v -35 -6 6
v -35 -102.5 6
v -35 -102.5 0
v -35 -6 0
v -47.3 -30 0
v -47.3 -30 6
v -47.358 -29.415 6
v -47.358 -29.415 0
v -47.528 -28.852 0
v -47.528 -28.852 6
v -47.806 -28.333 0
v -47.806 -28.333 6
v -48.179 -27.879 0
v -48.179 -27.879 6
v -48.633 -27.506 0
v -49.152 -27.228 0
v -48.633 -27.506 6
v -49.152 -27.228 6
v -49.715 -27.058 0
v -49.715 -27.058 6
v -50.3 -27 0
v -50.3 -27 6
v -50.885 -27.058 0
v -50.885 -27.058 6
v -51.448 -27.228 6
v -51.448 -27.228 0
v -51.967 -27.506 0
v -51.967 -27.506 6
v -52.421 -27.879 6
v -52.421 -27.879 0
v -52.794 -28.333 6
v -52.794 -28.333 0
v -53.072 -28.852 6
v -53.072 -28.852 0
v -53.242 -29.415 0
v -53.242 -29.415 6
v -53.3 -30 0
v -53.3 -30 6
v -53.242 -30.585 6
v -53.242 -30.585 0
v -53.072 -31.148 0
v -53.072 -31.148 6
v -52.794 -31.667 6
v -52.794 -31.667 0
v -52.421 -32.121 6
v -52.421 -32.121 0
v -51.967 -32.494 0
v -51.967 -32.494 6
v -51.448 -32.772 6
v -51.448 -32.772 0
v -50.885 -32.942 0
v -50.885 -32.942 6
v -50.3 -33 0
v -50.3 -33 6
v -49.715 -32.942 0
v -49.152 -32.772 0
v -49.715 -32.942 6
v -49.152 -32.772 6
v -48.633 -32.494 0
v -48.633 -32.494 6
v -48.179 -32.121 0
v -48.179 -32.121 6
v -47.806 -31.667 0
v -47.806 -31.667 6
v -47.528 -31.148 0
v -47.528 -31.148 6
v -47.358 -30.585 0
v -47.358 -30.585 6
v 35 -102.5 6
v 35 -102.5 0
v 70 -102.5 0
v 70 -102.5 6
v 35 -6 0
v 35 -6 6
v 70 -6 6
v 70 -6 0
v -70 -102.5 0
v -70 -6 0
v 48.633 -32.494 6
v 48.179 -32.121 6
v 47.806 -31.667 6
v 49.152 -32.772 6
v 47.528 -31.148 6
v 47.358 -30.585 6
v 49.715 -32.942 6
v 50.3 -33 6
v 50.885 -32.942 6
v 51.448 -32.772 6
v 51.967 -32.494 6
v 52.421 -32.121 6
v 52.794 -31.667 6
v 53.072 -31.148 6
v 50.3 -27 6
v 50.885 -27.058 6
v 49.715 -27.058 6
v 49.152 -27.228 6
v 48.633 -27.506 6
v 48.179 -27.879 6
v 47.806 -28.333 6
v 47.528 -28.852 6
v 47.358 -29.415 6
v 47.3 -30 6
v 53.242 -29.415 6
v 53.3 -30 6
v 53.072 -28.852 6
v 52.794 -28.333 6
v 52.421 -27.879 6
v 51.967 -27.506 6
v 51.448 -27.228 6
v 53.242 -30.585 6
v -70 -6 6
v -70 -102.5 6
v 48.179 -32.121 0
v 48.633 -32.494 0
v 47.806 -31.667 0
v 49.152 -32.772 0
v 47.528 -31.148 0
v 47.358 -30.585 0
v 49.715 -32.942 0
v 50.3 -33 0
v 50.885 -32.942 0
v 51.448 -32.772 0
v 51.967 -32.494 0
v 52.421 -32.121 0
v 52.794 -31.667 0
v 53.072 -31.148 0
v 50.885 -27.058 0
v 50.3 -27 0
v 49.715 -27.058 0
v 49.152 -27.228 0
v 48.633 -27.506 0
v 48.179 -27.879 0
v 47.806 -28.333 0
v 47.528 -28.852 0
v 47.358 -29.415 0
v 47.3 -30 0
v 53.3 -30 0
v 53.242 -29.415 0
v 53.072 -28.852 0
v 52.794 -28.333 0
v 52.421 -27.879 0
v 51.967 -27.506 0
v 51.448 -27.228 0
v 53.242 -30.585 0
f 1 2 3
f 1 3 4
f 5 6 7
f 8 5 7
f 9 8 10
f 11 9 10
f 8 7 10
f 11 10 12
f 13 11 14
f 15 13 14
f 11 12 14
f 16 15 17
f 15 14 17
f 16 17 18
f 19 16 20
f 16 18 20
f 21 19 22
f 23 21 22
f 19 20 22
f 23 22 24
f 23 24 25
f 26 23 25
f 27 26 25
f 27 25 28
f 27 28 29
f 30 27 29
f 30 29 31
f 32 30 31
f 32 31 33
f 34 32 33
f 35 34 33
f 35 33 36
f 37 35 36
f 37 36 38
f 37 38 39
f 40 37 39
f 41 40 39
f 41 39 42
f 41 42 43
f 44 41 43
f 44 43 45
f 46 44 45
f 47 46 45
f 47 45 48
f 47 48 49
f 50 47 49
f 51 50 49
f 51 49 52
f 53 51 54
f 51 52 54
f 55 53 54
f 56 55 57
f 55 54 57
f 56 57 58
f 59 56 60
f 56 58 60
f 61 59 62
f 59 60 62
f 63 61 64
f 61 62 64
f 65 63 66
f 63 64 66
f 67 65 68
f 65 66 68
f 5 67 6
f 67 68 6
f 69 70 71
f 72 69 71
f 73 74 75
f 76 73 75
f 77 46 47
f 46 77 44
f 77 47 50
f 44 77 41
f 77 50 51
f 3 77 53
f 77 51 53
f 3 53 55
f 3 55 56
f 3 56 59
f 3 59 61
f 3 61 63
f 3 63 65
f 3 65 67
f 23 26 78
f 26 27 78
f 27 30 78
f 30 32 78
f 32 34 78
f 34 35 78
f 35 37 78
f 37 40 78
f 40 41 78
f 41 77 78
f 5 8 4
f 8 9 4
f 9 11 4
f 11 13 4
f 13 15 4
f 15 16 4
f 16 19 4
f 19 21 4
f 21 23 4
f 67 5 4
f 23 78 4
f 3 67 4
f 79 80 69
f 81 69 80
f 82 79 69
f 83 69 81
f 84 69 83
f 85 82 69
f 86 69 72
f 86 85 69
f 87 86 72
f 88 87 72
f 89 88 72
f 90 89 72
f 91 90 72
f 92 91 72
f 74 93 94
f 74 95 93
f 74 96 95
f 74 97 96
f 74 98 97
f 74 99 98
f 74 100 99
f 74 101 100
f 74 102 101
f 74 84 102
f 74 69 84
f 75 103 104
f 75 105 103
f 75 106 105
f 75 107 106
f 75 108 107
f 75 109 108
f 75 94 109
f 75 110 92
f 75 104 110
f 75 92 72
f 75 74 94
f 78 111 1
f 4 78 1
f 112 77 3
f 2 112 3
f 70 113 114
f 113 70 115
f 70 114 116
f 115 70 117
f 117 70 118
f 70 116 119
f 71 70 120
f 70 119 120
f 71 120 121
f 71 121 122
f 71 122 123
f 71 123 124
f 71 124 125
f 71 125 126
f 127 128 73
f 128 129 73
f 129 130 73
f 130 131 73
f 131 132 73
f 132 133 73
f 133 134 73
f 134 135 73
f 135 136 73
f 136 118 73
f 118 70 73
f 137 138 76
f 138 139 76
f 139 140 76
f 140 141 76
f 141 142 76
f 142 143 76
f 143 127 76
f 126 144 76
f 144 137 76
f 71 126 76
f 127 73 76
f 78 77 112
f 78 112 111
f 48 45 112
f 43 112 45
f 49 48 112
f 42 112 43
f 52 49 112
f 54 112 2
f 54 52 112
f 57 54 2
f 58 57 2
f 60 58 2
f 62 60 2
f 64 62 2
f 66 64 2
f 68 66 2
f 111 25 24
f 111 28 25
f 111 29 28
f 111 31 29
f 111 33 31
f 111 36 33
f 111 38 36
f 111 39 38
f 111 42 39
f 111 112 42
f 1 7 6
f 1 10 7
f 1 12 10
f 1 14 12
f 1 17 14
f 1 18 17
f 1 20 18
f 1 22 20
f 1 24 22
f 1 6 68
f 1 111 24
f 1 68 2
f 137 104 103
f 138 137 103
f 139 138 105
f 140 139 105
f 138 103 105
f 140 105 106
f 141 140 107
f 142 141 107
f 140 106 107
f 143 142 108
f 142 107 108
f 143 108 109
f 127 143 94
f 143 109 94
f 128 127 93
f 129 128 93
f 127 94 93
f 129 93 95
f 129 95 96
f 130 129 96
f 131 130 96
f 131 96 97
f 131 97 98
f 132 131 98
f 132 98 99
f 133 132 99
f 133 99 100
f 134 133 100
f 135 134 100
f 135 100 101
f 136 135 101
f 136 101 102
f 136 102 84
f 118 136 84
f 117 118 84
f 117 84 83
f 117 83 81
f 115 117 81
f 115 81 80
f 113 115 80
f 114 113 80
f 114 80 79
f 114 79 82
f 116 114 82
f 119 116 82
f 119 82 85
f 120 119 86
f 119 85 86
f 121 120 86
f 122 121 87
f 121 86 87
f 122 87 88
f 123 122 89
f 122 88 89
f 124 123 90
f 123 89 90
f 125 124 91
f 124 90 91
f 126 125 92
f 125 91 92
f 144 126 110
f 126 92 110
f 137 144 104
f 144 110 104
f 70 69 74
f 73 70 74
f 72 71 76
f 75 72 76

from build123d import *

# Parameters (mm, degrees)
SKETCH1_W           = 140
SKETCH1_H           = 165
BOSS_EXTRUDE1_DEPTH = 6
FILLET1_R           = 10
SKETCH9_R           = 3
CUT_EXTRUDE1_DEPTH  = 10
SKETCH10_W          = 70
SKETCH10_H          = 195.841362381
CUT_EXTRUDE2_DEPTH  = 10
SKETCH11_W          = 172.77482736
SKETCH11_H          = 74.169235041
CUT_EXTRUDE4_DEPTH  = 10


with BuildPart() as part:
    # Sketch1 → Boss-Extrude1 (new body)
    with BuildSketch(Plane.XY):
        with Locations((0, -20)):
            Rectangle(SKETCH1_W, SKETCH1_H)
    extrude(amount=BOSS_EXTRUDE1_DEPTH)

    # Fillet1
    fillet1_edges = [part.edges().sort_by_distance(p)[0] for p in [
        (-70, 62.5, 3),
        (70, 62.5, 3),
    ]]
    fillet(fillet1_edges, radius=FILLET1_R)

    # Sketch9 → Cut-Extrude1 (cut)
    with BuildSketch(Plane.XY.offset(6)):
        with Locations((50.3, 30)):
            Circle(SKETCH9_R)
        with Locations((50.3, -30)):
            Circle(SKETCH9_R)
        with Locations((-50.3, 30)):
            Circle(SKETCH9_R)
        with Locations((-50.3, -30)):
            Circle(SKETCH9_R)
    extrude(amount=-CUT_EXTRUDE1_DEPTH, mode=Mode.SUBTRACT)

    # Sketch10 → Cut-Extrude2 (cut)
    with BuildSketch(Plane.XY.offset(6)):
        with Locations((0, -19.291507384)):
            Rectangle(SKETCH10_W, SKETCH10_H)
    extrude(amount=-CUT_EXTRUDE2_DEPTH, mode=Mode.SUBTRACT)

    # Sketch11 → Cut-Extrude4 (cut)
    with BuildSketch(Plane.XY.offset(6)):
        with Locations((1.670358486, 31.084617521)):
            Rectangle(SKETCH11_W, SKETCH11_H)
    extrude(amount=-CUT_EXTRUDE4_DEPTH, mode=Mode.SUBTRACT)


solid = part.part
